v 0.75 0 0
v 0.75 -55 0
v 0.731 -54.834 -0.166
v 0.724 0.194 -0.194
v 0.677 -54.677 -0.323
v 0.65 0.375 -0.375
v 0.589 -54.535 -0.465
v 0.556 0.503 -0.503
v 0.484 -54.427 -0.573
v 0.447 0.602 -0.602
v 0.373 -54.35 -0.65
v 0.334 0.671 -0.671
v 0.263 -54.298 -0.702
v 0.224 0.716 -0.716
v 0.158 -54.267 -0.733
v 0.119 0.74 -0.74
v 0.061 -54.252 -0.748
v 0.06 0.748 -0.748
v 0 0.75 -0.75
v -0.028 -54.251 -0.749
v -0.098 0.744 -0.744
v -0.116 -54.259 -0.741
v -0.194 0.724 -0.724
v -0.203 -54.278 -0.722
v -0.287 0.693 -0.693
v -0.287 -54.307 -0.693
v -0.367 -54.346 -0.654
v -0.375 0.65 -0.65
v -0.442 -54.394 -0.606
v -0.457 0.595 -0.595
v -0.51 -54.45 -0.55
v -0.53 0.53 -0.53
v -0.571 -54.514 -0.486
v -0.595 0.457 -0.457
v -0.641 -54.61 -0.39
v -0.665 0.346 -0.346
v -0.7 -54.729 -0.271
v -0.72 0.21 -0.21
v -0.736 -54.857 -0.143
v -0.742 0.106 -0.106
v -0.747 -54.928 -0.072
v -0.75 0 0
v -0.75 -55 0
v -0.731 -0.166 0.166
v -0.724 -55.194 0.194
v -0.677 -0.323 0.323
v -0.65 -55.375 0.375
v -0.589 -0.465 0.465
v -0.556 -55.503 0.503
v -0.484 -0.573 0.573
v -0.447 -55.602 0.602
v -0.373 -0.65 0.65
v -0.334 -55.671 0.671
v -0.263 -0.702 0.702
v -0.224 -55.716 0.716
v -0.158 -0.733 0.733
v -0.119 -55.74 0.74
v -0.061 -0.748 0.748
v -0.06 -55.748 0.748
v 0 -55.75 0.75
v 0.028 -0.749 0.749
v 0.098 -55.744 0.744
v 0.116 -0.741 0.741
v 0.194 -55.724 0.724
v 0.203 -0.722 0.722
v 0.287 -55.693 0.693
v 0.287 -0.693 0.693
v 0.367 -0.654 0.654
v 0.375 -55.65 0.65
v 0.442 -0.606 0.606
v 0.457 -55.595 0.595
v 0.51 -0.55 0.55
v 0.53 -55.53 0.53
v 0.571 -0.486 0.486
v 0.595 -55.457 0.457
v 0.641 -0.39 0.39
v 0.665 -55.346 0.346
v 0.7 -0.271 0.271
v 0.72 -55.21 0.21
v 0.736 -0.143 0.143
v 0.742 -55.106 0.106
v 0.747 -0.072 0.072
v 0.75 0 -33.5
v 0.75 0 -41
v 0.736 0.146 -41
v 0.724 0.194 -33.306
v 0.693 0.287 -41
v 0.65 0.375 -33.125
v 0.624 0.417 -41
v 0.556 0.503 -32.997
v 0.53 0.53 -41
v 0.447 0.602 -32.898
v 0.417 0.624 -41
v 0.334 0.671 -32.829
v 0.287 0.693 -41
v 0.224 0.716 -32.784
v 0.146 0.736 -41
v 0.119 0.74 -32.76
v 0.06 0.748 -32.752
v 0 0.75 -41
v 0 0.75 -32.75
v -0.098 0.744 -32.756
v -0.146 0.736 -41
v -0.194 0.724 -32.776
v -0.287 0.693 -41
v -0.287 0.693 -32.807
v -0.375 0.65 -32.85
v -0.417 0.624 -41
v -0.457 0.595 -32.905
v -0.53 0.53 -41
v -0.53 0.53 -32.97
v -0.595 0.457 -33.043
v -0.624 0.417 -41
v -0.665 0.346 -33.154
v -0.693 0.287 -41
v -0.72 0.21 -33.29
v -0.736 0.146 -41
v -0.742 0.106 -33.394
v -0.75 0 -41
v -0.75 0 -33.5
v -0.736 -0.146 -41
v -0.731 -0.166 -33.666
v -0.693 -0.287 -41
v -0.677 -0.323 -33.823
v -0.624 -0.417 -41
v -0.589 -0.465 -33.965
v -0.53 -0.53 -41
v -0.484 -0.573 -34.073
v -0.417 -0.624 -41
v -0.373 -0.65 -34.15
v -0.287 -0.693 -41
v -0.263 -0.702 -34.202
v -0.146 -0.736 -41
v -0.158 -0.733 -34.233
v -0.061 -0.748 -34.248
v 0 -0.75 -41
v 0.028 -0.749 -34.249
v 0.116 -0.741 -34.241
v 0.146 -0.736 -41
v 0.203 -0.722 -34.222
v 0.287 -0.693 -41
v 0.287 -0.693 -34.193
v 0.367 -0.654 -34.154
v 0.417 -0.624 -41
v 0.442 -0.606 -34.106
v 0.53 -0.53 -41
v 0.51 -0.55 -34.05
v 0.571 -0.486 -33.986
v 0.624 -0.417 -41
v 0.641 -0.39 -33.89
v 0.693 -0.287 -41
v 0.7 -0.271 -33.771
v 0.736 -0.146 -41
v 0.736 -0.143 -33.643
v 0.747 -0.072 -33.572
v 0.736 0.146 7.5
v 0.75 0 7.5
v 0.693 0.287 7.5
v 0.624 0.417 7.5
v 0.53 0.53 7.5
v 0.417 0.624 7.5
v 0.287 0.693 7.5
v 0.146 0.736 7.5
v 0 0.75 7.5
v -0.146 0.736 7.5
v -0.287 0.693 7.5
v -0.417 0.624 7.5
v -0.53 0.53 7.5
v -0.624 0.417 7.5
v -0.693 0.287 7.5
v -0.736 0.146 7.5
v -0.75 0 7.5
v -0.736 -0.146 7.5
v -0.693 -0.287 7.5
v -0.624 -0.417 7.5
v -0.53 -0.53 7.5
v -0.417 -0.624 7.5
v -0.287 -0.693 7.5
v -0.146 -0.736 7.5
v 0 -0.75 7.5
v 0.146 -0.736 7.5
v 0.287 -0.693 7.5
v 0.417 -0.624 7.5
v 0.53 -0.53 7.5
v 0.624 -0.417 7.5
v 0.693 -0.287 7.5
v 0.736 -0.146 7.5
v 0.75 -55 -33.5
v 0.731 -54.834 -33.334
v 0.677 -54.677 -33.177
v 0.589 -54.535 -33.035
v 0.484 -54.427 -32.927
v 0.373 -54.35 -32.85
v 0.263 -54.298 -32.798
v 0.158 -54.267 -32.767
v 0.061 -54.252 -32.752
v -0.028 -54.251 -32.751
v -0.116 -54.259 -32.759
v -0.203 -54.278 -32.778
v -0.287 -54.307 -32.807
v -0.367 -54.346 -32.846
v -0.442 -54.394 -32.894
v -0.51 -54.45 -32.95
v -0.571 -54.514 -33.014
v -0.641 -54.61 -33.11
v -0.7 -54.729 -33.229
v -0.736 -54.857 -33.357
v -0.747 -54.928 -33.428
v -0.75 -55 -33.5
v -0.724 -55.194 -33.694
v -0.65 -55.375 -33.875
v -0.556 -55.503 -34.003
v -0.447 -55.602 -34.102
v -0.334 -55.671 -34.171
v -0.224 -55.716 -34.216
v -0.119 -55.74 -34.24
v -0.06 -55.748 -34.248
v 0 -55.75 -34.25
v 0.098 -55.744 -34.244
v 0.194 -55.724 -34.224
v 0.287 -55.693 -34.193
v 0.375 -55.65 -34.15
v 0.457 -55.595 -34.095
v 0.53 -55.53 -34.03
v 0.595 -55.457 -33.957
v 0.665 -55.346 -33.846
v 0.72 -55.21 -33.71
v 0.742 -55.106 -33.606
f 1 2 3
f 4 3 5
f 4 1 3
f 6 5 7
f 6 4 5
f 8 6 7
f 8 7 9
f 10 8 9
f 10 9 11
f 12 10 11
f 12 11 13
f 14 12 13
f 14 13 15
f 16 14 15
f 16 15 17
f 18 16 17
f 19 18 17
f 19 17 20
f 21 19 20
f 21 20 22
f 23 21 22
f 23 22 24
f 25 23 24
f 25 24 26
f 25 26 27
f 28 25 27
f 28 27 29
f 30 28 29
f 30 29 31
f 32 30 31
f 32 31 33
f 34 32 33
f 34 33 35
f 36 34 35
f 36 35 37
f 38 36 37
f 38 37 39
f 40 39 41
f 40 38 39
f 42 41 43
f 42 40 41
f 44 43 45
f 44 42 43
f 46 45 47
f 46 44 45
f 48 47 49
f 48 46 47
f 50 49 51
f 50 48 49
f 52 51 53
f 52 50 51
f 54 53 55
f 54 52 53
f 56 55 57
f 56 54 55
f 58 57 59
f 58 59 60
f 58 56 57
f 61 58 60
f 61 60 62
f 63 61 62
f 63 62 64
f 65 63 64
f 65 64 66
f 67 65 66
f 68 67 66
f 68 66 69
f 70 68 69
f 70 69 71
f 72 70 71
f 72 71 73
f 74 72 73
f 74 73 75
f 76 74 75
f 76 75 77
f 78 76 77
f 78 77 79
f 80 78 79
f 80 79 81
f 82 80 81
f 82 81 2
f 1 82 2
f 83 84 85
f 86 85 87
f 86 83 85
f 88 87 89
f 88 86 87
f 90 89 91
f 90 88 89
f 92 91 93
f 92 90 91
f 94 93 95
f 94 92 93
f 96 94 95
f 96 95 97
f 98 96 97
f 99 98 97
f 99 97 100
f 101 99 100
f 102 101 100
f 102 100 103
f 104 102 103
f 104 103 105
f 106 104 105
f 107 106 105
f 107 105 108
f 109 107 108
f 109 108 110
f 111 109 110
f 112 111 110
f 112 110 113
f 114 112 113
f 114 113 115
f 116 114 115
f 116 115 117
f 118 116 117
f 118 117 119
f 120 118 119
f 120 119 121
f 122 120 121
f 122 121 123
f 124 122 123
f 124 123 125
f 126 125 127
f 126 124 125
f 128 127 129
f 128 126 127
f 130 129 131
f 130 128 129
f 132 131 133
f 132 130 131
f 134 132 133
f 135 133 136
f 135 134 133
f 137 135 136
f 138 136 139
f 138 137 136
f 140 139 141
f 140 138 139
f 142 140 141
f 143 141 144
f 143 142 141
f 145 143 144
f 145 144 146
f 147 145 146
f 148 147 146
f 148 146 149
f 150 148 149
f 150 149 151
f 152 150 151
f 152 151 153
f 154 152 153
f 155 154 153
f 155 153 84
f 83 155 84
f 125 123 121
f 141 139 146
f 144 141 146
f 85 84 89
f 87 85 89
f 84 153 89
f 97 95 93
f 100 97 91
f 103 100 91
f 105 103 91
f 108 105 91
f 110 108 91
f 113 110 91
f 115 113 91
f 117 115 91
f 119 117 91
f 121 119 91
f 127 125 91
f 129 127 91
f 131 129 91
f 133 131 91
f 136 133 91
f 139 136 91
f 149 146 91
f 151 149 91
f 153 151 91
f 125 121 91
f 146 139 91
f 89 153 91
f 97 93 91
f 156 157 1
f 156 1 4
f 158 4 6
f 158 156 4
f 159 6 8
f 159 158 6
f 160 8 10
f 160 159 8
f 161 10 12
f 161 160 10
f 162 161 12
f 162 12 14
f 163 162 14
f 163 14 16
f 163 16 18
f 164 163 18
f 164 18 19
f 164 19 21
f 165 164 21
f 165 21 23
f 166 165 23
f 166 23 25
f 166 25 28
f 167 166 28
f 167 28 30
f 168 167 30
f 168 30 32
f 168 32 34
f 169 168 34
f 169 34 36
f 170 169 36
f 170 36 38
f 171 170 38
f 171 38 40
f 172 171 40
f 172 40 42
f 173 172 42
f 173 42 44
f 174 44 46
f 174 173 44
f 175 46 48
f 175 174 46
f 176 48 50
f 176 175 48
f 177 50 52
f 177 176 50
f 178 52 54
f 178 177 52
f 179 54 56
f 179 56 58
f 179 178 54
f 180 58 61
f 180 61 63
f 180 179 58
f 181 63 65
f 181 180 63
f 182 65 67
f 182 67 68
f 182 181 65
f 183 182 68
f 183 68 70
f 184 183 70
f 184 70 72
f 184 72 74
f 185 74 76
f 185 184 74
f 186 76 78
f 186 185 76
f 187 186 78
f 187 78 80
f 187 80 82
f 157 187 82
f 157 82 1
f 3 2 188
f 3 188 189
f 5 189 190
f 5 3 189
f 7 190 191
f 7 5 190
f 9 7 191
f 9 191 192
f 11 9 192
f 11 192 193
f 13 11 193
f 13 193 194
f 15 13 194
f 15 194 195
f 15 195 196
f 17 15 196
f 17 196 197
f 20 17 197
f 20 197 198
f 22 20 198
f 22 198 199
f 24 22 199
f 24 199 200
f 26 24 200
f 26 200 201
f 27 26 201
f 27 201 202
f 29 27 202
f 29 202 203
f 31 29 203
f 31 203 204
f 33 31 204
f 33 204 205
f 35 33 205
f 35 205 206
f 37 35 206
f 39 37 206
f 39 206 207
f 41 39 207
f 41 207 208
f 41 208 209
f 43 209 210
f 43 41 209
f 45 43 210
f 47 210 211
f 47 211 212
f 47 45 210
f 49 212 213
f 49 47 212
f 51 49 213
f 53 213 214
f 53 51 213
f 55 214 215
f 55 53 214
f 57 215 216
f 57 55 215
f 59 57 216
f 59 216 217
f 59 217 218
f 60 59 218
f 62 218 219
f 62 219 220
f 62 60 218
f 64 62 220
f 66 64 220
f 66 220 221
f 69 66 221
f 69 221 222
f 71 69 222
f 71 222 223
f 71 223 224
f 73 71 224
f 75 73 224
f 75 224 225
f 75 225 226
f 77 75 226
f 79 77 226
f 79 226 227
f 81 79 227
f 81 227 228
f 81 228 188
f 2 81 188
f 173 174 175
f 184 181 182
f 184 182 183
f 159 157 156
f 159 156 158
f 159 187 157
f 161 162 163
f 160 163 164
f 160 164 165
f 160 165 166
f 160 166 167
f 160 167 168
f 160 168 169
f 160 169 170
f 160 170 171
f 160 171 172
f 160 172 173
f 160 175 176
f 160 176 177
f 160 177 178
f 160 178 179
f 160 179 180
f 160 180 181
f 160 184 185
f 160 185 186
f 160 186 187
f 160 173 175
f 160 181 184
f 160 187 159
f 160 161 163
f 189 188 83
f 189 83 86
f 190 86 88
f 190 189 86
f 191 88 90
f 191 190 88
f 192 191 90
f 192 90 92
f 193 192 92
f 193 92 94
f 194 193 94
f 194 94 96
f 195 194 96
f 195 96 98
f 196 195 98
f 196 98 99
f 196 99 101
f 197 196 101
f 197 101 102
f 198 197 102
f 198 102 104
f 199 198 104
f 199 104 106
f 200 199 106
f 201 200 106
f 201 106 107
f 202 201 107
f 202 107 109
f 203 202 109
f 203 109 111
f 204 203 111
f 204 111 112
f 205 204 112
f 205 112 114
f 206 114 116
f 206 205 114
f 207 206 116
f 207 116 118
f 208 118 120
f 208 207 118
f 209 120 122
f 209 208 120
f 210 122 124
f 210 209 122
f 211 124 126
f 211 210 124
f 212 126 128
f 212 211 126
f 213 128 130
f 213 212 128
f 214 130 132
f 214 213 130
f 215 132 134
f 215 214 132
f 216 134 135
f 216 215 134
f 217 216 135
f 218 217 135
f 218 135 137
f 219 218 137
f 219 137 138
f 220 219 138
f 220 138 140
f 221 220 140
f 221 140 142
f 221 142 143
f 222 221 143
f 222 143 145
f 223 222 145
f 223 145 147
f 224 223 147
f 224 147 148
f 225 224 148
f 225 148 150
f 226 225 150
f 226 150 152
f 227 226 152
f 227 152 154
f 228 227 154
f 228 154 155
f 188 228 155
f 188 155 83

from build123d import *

# Parameters (mm, degrees)
SKETCH2_R = 0.75


with BuildPart() as part:
    # Sweep1: sweep along a path in Sketch1
    with BuildLine(Plane(origin=(0, 0, 0), x_dir=(0, 0, -1), z_dir=(1, 0, 0))) as sweep1_path:
        Line((41, 0), (33.5, 0))
        Line((33.5, 0), (33.5, -55))
        Line((33.5, -55), (0, -55))
        Line((0, -55), (0, 0))
        Line((0, 0), (-7.5, 0))
    # Sketch2 → Sweep1 (sweep)
    with BuildSketch(Plane.XY.offset(7.5)):
        Circle(SKETCH2_R)
    sweep(path=sweep1_path.line, transition=Transition.RIGHT)


solid = part.part
